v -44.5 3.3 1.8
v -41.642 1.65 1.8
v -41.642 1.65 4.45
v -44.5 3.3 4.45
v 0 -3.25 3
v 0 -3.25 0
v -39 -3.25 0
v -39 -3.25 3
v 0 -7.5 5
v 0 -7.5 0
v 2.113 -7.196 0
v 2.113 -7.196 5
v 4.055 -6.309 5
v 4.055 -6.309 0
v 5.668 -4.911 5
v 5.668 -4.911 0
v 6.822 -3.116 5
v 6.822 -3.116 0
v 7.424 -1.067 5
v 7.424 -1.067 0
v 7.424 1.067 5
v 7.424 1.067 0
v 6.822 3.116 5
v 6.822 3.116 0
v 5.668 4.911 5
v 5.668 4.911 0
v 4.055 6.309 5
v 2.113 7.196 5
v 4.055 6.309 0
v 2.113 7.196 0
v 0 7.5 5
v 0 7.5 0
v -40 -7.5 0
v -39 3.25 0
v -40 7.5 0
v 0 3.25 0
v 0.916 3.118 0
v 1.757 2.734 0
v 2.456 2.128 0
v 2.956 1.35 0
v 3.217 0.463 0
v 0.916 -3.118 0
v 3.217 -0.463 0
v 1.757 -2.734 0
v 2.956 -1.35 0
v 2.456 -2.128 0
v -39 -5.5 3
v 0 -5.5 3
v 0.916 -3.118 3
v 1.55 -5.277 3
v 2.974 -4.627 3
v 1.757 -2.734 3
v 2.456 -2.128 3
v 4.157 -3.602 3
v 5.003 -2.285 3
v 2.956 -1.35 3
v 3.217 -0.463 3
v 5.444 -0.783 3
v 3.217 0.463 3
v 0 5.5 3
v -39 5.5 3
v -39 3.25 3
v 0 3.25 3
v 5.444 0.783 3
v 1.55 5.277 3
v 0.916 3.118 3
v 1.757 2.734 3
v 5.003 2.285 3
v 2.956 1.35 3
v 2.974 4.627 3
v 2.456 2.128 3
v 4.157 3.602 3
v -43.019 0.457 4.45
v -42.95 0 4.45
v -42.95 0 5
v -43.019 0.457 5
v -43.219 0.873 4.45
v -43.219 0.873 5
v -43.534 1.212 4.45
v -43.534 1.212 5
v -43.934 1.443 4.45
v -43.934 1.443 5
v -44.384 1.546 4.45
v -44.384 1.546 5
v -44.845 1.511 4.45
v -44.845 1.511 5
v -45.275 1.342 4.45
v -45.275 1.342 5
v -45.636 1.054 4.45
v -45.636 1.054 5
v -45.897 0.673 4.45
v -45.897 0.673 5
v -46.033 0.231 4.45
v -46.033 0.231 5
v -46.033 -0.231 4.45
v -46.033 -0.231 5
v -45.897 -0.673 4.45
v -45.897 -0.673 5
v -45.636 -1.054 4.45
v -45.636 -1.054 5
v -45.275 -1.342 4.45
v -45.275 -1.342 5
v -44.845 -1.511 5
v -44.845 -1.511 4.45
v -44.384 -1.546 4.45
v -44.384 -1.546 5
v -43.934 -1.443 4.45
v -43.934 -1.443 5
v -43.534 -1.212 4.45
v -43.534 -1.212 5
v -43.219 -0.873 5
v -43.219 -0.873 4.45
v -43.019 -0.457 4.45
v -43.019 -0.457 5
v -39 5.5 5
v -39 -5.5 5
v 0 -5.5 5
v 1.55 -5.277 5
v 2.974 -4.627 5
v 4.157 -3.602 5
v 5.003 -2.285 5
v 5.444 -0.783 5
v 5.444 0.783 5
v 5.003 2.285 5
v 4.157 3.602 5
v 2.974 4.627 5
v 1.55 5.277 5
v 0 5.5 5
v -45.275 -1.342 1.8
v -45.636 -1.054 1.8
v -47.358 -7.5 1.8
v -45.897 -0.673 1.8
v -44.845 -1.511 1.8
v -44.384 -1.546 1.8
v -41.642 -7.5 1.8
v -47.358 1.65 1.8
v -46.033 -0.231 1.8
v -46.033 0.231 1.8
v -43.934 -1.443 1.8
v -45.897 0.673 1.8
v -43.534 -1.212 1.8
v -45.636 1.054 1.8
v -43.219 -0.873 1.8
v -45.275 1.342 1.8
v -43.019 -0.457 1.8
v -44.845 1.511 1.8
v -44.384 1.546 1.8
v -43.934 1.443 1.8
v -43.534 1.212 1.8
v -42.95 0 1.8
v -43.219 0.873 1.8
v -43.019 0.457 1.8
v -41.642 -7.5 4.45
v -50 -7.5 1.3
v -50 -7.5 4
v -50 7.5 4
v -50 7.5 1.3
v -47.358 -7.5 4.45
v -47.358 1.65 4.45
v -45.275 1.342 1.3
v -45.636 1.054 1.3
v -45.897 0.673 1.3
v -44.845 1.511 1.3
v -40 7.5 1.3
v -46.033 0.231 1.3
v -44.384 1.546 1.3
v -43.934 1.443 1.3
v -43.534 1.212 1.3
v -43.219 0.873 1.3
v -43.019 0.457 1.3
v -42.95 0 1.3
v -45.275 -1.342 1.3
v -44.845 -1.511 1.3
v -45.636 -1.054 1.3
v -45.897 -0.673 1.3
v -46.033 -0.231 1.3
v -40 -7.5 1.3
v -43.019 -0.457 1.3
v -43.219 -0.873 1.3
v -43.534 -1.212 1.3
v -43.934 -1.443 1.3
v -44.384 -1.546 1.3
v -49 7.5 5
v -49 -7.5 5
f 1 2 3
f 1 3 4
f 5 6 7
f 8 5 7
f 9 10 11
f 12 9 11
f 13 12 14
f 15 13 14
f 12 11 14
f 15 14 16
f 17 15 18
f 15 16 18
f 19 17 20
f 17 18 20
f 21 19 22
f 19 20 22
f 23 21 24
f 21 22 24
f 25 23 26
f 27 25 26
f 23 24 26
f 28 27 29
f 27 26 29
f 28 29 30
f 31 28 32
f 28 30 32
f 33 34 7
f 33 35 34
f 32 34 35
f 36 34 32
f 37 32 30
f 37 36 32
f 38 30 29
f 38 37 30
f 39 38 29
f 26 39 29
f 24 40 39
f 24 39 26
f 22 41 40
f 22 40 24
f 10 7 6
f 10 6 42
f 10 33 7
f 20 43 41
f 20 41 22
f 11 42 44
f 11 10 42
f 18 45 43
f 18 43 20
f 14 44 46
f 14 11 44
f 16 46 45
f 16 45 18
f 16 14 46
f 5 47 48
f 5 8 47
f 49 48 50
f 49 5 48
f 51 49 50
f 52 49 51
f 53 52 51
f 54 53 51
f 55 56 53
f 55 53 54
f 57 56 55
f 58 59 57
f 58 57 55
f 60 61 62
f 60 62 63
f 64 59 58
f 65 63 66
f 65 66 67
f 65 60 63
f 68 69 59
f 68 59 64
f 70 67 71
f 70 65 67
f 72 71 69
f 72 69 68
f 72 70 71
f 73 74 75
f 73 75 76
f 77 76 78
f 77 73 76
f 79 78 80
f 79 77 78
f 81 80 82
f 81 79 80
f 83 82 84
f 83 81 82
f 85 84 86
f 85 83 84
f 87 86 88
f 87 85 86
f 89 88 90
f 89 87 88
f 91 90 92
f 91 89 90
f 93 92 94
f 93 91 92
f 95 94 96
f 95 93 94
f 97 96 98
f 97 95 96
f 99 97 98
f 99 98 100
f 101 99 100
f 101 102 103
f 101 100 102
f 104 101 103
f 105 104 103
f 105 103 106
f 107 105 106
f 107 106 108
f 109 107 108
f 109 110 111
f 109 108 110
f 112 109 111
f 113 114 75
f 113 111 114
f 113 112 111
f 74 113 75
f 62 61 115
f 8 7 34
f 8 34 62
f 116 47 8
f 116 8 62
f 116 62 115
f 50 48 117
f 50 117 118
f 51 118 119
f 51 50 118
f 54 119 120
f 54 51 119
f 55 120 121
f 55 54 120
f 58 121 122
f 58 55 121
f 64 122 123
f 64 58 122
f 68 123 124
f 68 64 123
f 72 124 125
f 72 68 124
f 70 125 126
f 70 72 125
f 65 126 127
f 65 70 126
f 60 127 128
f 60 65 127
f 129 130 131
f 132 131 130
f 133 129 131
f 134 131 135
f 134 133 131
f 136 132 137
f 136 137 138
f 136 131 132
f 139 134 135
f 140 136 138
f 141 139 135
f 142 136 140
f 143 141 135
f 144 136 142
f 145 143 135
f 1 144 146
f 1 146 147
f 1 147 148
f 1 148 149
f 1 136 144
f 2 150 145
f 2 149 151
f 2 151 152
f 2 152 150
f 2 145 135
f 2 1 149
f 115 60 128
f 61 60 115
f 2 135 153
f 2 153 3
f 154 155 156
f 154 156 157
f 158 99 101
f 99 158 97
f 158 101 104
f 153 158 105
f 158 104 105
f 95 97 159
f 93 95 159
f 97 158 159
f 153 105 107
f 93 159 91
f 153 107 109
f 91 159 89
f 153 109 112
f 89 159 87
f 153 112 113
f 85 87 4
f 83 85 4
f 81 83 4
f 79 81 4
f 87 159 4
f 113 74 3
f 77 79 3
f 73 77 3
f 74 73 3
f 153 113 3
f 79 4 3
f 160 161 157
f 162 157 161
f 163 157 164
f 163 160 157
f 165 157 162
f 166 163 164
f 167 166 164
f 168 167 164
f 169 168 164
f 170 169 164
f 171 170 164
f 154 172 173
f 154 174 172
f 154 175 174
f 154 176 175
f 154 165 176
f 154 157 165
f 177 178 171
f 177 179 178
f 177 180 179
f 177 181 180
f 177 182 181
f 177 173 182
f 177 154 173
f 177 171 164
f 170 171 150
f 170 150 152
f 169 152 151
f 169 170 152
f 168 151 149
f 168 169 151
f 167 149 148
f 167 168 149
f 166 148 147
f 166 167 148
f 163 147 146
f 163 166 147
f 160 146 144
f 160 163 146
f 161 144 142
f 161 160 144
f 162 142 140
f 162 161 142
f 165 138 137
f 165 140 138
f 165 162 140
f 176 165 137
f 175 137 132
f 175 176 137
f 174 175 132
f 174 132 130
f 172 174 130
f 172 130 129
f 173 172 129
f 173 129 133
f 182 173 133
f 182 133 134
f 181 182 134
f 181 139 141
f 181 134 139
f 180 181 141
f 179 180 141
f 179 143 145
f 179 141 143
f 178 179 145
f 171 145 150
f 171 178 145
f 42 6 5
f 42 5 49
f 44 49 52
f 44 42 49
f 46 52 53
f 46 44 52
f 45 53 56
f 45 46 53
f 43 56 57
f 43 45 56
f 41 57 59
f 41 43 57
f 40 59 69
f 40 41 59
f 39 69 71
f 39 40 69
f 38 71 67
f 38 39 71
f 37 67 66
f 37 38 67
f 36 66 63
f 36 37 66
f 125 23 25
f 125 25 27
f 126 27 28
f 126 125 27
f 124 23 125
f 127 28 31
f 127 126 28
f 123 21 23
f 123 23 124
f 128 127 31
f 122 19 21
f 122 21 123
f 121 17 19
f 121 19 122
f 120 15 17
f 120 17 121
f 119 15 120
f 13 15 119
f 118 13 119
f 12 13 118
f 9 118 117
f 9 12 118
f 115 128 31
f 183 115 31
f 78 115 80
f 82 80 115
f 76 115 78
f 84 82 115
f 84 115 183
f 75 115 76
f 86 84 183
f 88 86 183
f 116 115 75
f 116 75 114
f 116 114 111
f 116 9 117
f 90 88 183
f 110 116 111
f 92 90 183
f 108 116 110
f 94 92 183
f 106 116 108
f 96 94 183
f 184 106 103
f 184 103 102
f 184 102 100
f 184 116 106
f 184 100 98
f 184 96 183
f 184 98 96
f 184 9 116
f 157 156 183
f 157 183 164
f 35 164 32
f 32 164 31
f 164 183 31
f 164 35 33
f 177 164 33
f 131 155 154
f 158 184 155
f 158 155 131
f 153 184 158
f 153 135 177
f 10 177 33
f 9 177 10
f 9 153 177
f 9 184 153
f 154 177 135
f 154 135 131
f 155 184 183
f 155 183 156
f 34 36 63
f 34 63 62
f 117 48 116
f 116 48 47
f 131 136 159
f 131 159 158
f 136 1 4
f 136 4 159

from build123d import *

# Parameters (mm, degrees)
PAD004_DEPTH    = 5
POCKET004_DEPTH = 2.001
PAD005_DEPTH    = 15
SKETCH015_R     = 1.55
POCKET005_DEPTH = 5.001
POCKET006_DEPTH = 2.65


with BuildPart() as part:
    # Sketch013 → Pad004 (new body)
    with BuildSketch(Plane.XY):
        with BuildLine():
            ThreePointArc((0, -7.5), (7.5, 0), (0, 7.5))
            Line((0, 7.5), (-40, 7.5))
            Line((-40, 7.5), (-40, 3.25))
            Line((0, 3.25), (-40, 3.25))
            ThreePointArc((0, -3.25), (3.25, 0), (0, 3.25))
            Line((0, -3.25), (-40, -3.25))
            Line((-40, -3.25), (-40, -7.5))
            Line((0, -7.5), (-40, -7.5))
        make_face()
    extrude(amount=PAD004_DEPTH)

    # Sketch012 → Pocket004 (cut, through all)
    with BuildSketch(Plane.XY.offset(3)):
        with BuildLine():
            ThreePointArc((0, -5.5), (5.5, 0), (0, 5.5))
            Line((0, 5.5), (-40, 5.5))
            ThreePointArc((-40, 5.5), (-45.5, 0), (-40, -5.5))
            Line((0, -5.5), (-40, -5.5))
        make_face()
    extrude(amount=POCKET004_DEPTH, mode=Mode.SUBTRACT)

    # Sketch014 → Pad005 (join)
    with BuildSketch(Plane.XZ.offset(7.5)):
        Polygon((-49, 5), (-50, 4), (-50, 1.3), (-40, 1.3), (-40, 0), (-39, 0), (-39, 5), (-40, 5), align=None)
    extrude(amount=-PAD005_DEPTH)

    # Sketch015 → Pocket005 (cut, through all)
    with BuildSketch(Plane.XY):
        with Locations((-44.5, 0)):
            Circle(SKETCH015_R)
    extrude(amount=POCKET005_DEPTH, mode=Mode.SUBTRACT)

    # Sketch016 → Pocket006 (cut)
    with BuildSketch(Plane.XY.offset(1.8)):
        Polygon((-44.5, 3.3), (-47.357884, 1.65), (-47.357884, -1.65), (-47.357884, -8.65), (-41.642116, -8.65), (-41.642116, -1.65), (-41.642116, 1.65), align=None)
    extrude(amount=POCKET006_DEPTH, mode=Mode.SUBTRACT)


solid = part.part
